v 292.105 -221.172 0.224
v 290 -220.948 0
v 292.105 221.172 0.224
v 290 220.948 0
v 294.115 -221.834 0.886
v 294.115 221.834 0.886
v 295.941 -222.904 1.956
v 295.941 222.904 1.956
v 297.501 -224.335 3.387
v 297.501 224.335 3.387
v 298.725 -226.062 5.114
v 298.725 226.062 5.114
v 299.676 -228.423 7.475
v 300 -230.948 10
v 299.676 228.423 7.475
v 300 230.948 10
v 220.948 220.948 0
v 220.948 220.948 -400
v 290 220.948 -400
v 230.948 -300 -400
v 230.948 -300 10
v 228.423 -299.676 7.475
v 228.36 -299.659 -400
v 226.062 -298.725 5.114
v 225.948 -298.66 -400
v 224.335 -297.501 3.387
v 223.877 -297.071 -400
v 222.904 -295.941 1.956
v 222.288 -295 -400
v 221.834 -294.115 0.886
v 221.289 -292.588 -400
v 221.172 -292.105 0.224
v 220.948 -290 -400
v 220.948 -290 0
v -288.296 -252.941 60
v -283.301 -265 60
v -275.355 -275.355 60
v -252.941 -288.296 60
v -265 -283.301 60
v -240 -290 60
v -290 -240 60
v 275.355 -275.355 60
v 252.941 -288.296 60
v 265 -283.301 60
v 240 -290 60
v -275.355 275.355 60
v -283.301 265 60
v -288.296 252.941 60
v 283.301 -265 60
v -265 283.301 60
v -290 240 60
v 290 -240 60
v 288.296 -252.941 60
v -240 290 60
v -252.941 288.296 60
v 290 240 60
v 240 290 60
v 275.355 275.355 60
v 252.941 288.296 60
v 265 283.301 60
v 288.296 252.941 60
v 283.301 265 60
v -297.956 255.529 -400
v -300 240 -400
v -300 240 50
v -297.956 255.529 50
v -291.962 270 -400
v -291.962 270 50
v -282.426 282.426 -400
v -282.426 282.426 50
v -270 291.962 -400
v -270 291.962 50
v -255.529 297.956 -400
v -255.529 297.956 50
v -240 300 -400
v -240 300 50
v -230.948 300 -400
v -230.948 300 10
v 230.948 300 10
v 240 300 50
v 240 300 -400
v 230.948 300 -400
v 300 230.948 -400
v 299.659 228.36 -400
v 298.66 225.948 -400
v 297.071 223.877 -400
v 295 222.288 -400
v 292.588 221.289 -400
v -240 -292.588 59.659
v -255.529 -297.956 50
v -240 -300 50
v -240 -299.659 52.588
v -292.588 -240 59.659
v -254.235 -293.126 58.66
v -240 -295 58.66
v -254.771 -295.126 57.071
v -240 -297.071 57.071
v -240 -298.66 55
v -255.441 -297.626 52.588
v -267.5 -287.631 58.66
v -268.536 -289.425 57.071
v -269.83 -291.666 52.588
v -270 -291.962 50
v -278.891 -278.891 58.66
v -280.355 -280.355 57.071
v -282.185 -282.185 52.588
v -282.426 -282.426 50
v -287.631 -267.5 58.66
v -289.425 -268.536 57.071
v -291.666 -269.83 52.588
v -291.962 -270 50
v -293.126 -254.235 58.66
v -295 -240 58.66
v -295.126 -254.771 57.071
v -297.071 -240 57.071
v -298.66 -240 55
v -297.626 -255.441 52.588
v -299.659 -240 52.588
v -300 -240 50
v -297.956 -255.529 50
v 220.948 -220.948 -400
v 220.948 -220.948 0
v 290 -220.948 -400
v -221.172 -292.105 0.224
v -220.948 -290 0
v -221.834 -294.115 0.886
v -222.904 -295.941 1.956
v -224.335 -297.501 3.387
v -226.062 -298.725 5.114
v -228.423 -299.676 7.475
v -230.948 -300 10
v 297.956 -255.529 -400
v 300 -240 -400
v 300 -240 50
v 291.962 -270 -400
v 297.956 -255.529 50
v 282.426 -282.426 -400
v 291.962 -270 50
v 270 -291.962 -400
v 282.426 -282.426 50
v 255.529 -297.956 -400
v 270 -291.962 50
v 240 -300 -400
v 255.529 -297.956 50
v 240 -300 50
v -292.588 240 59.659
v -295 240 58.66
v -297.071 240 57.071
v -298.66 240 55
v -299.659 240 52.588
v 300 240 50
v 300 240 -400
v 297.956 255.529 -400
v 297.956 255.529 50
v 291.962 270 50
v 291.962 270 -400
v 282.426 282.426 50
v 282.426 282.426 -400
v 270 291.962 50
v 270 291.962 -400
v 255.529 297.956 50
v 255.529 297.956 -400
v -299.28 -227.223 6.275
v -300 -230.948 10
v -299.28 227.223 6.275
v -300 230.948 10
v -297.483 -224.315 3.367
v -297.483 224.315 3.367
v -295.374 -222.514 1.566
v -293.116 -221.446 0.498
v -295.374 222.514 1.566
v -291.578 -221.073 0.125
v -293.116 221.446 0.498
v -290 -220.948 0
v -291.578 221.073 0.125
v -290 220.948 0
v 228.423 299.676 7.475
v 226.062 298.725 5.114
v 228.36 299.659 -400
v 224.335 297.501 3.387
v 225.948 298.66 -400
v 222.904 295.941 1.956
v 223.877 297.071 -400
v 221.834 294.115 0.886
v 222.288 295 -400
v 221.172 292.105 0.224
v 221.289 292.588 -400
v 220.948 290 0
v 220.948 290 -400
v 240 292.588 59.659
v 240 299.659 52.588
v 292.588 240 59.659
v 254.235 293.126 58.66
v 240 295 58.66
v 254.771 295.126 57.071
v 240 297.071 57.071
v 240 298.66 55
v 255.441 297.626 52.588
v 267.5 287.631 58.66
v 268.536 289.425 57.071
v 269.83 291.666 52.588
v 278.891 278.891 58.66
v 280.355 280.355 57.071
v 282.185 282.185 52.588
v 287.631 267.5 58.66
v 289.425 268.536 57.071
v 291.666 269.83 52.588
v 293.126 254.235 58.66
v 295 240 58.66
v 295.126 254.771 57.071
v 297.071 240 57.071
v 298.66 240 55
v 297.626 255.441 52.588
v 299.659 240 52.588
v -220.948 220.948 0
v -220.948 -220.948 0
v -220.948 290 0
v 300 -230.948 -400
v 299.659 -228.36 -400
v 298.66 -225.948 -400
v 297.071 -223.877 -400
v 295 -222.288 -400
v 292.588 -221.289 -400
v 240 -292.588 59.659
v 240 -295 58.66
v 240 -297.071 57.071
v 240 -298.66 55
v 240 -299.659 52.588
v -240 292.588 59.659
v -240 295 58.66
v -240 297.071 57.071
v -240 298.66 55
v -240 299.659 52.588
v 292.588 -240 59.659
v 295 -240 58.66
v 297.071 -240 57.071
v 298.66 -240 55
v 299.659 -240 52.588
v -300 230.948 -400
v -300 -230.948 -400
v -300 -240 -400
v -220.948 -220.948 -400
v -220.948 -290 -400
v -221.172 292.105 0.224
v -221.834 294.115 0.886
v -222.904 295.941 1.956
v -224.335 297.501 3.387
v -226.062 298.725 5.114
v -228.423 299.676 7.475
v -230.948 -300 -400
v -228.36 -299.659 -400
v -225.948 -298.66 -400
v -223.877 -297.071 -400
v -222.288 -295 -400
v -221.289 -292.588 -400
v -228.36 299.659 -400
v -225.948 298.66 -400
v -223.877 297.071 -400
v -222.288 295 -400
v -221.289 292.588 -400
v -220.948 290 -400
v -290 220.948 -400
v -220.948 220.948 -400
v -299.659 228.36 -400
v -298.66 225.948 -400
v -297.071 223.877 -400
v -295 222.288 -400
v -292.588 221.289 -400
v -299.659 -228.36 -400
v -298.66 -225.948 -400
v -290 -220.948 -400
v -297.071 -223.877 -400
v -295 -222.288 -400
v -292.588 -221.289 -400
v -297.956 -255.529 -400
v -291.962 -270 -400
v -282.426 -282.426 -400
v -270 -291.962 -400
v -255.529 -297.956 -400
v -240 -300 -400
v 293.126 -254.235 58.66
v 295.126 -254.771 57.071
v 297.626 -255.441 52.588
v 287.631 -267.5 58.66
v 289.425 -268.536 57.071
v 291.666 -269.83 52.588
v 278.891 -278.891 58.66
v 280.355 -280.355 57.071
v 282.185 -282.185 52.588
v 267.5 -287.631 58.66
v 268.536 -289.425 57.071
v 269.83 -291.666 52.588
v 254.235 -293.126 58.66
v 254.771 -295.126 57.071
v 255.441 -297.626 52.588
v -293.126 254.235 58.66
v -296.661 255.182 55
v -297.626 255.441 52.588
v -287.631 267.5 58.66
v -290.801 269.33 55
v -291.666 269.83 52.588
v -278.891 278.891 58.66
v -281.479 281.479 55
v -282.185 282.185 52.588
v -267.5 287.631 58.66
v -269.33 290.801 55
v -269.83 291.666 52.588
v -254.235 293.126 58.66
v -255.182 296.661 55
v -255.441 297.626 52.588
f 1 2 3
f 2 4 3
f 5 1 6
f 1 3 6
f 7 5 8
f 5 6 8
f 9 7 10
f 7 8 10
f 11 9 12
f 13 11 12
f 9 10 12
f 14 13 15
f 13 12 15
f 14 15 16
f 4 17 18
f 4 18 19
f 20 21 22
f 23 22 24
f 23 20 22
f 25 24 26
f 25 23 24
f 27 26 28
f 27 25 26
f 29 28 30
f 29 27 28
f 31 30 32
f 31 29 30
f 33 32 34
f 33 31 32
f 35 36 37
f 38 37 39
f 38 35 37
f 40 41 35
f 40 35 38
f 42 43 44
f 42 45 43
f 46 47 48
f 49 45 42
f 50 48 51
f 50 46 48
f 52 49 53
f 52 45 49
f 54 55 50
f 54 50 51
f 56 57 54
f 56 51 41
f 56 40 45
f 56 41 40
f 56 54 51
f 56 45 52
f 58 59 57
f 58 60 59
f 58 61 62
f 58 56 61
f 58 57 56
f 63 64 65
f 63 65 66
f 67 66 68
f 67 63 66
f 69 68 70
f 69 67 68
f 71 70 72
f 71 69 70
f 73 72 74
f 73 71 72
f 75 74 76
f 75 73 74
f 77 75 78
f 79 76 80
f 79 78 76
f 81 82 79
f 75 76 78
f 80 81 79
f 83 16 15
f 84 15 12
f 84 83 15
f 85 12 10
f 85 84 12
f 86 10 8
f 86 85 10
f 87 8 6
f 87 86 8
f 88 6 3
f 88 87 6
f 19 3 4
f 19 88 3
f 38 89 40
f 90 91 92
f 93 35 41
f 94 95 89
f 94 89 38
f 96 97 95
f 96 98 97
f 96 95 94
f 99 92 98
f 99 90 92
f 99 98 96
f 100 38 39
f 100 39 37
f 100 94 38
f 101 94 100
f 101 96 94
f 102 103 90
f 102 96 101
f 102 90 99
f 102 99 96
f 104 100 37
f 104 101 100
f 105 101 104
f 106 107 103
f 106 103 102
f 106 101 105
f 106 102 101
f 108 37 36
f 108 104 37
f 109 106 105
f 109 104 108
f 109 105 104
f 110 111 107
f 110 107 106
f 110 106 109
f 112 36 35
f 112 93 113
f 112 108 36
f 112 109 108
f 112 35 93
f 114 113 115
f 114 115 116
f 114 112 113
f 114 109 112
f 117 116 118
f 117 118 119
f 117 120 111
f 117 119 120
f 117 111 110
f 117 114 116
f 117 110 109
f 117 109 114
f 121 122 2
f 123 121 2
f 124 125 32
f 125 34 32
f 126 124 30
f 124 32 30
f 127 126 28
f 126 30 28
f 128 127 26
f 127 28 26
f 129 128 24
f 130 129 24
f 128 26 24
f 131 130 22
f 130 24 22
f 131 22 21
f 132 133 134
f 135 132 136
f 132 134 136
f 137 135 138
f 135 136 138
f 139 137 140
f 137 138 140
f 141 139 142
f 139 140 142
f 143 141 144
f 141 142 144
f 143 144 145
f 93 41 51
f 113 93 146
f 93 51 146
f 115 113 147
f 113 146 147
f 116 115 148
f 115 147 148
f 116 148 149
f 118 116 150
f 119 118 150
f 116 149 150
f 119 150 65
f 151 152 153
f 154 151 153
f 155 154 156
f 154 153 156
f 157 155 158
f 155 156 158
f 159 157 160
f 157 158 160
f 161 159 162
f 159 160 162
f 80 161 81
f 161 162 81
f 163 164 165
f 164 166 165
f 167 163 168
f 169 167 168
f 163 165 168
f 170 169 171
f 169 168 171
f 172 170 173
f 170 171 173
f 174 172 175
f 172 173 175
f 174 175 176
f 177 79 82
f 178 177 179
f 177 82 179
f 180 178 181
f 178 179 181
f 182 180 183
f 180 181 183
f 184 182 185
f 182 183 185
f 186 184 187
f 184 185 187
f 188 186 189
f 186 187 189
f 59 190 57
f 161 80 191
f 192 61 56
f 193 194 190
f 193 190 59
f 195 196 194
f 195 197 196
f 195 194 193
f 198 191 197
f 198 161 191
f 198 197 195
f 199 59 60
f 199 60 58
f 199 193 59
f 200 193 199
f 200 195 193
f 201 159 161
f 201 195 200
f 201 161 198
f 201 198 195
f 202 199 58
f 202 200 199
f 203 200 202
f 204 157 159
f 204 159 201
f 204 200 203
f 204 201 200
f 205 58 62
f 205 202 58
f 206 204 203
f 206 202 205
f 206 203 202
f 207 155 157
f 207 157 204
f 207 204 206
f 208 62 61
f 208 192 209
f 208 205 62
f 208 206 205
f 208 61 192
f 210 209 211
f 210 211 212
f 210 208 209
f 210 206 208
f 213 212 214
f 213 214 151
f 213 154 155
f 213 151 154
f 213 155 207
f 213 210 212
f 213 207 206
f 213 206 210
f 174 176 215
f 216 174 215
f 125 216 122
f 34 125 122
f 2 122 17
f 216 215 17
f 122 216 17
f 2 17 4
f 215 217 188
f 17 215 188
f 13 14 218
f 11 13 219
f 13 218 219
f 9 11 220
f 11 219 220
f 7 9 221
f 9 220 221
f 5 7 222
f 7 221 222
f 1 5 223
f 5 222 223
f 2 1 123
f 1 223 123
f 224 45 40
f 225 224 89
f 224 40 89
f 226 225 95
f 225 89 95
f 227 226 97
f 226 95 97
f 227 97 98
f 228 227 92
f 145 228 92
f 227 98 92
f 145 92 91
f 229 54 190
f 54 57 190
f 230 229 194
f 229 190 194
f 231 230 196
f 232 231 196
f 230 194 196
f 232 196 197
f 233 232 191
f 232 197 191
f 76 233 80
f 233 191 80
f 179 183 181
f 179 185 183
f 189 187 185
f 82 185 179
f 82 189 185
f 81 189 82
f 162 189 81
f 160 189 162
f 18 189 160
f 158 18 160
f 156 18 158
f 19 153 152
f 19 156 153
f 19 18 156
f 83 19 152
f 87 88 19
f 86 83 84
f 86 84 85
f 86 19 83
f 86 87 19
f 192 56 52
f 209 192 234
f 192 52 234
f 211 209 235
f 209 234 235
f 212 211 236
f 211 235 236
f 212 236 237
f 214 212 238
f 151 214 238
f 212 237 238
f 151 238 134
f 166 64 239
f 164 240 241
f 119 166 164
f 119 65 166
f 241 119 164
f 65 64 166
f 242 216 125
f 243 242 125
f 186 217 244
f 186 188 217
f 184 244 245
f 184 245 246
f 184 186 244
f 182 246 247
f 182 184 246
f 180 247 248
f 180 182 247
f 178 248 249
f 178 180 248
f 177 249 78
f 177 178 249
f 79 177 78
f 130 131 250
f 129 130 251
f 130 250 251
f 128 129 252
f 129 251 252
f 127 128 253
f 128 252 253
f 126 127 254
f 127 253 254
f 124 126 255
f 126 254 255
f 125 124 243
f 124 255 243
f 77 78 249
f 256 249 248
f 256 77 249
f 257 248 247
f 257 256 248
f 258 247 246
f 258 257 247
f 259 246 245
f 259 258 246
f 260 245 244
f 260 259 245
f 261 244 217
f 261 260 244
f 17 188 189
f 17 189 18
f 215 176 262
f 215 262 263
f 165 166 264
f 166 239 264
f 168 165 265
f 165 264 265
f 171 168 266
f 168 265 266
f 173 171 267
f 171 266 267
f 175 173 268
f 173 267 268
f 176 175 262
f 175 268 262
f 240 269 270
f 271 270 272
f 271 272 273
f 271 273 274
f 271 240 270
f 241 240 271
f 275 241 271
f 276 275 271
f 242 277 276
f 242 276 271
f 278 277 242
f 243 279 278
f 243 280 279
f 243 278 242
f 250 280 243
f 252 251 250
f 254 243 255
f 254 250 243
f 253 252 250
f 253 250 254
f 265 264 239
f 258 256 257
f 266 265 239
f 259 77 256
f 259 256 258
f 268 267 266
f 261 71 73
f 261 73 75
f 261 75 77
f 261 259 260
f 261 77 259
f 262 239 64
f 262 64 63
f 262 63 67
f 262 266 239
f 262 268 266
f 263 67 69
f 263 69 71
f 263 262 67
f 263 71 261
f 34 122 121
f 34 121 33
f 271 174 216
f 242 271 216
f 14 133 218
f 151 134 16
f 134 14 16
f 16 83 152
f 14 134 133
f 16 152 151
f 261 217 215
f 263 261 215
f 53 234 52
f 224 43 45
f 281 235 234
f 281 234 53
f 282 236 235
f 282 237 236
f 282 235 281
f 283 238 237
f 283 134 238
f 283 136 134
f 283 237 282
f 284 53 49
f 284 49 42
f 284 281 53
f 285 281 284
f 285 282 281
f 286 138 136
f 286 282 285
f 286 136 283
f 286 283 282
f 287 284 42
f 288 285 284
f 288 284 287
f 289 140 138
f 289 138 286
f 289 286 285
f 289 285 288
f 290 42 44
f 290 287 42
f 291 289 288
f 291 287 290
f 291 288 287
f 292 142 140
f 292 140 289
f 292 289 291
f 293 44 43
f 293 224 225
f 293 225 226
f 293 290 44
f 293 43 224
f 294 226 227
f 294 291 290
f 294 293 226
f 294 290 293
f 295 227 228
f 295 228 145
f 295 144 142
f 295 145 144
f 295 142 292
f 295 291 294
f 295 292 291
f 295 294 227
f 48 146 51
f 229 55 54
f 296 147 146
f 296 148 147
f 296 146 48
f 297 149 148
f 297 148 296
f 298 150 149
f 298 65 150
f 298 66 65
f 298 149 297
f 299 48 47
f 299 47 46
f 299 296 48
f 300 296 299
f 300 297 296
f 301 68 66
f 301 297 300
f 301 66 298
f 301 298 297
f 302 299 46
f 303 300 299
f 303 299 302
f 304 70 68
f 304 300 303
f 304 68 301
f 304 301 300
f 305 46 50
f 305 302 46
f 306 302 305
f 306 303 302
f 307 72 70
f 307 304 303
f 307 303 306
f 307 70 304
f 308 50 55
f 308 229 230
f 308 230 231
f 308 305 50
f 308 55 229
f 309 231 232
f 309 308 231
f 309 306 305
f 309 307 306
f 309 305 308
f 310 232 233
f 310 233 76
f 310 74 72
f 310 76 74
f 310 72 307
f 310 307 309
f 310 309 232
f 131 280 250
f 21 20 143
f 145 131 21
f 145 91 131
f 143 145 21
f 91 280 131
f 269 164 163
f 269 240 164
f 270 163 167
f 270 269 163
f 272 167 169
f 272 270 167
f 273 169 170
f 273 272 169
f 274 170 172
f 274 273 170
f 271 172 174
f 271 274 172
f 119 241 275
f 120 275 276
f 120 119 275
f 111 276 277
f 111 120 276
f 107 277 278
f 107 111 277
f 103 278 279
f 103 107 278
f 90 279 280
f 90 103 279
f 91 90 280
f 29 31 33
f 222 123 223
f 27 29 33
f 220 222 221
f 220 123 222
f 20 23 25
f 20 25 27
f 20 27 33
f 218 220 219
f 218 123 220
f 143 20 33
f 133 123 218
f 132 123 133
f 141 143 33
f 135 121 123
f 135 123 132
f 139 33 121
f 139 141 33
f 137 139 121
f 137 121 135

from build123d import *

# Parameters (mm, degrees)
F0_W     = 600
F0_H     = 600
F1_DEPTH = 60
F2_W     = 79.0521234274
F2_H     = 79.0521234274
F3_DEPTH = 400
F4_R     = 60
F5_R     = 10


with BuildPart() as f1:
    # F0 (on Top) → F1 (new body)
    with BuildSketch(Plane.XY):
        Rectangle(F0_W, F0_H)
    extrude(amount=F1_DEPTH)

    # F2 (on face) → F3 (join)
    with BuildSketch(Plane(origin=(0, 0, 0), x_dir=(1, 0, 0), z_dir=(0, 0, -1))):
        with Locations((-260.4739382863, 260.4739382863)):
            Rectangle(F2_W, F2_H)
        with Locations((260.4739382863, 260.4739382863)):
            Rectangle(F2_W, F2_H)
        with Locations((-260.4739382863, -260.4739382863)):
            Rectangle(F2_W, F2_H)
        with Locations((260.4739382863, -260.4739382863)):
            Rectangle(F2_W, F2_H)
    extrude(amount=F3_DEPTH)

    # F4
    f4_edges = [f1.edges().sort_by_distance(p)[0] for p in [
        (-300, -300, -170),
        (-300, 300, -170),
        (300, 300, -170),
        (300, -300, -170),
    ]]
    fillet(f4_edges, radius=F4_R)

    # F5
    f5_edges = [f1.edges().sort_by_distance(p)[0] for p in [
        (0, 300, 60),
        (0, 300, 0),
        (220.947877, 300, -200),
        (-220.947877, 300, -200),
        (-300, 0, 0),
        (-300, 220.947877, -200),
        (-300, -220.947877, -200),
        (0, -300, 0),
        (-220.947877, -300, -200),
        (220.947877, -300, -200),
        (300, 0, 0),
        (300, -220.947877, -200),
        (300, 220.947877, -200),
    ]]
    fillet(f5_edges, radius=F5_R)


solid = f1.part
